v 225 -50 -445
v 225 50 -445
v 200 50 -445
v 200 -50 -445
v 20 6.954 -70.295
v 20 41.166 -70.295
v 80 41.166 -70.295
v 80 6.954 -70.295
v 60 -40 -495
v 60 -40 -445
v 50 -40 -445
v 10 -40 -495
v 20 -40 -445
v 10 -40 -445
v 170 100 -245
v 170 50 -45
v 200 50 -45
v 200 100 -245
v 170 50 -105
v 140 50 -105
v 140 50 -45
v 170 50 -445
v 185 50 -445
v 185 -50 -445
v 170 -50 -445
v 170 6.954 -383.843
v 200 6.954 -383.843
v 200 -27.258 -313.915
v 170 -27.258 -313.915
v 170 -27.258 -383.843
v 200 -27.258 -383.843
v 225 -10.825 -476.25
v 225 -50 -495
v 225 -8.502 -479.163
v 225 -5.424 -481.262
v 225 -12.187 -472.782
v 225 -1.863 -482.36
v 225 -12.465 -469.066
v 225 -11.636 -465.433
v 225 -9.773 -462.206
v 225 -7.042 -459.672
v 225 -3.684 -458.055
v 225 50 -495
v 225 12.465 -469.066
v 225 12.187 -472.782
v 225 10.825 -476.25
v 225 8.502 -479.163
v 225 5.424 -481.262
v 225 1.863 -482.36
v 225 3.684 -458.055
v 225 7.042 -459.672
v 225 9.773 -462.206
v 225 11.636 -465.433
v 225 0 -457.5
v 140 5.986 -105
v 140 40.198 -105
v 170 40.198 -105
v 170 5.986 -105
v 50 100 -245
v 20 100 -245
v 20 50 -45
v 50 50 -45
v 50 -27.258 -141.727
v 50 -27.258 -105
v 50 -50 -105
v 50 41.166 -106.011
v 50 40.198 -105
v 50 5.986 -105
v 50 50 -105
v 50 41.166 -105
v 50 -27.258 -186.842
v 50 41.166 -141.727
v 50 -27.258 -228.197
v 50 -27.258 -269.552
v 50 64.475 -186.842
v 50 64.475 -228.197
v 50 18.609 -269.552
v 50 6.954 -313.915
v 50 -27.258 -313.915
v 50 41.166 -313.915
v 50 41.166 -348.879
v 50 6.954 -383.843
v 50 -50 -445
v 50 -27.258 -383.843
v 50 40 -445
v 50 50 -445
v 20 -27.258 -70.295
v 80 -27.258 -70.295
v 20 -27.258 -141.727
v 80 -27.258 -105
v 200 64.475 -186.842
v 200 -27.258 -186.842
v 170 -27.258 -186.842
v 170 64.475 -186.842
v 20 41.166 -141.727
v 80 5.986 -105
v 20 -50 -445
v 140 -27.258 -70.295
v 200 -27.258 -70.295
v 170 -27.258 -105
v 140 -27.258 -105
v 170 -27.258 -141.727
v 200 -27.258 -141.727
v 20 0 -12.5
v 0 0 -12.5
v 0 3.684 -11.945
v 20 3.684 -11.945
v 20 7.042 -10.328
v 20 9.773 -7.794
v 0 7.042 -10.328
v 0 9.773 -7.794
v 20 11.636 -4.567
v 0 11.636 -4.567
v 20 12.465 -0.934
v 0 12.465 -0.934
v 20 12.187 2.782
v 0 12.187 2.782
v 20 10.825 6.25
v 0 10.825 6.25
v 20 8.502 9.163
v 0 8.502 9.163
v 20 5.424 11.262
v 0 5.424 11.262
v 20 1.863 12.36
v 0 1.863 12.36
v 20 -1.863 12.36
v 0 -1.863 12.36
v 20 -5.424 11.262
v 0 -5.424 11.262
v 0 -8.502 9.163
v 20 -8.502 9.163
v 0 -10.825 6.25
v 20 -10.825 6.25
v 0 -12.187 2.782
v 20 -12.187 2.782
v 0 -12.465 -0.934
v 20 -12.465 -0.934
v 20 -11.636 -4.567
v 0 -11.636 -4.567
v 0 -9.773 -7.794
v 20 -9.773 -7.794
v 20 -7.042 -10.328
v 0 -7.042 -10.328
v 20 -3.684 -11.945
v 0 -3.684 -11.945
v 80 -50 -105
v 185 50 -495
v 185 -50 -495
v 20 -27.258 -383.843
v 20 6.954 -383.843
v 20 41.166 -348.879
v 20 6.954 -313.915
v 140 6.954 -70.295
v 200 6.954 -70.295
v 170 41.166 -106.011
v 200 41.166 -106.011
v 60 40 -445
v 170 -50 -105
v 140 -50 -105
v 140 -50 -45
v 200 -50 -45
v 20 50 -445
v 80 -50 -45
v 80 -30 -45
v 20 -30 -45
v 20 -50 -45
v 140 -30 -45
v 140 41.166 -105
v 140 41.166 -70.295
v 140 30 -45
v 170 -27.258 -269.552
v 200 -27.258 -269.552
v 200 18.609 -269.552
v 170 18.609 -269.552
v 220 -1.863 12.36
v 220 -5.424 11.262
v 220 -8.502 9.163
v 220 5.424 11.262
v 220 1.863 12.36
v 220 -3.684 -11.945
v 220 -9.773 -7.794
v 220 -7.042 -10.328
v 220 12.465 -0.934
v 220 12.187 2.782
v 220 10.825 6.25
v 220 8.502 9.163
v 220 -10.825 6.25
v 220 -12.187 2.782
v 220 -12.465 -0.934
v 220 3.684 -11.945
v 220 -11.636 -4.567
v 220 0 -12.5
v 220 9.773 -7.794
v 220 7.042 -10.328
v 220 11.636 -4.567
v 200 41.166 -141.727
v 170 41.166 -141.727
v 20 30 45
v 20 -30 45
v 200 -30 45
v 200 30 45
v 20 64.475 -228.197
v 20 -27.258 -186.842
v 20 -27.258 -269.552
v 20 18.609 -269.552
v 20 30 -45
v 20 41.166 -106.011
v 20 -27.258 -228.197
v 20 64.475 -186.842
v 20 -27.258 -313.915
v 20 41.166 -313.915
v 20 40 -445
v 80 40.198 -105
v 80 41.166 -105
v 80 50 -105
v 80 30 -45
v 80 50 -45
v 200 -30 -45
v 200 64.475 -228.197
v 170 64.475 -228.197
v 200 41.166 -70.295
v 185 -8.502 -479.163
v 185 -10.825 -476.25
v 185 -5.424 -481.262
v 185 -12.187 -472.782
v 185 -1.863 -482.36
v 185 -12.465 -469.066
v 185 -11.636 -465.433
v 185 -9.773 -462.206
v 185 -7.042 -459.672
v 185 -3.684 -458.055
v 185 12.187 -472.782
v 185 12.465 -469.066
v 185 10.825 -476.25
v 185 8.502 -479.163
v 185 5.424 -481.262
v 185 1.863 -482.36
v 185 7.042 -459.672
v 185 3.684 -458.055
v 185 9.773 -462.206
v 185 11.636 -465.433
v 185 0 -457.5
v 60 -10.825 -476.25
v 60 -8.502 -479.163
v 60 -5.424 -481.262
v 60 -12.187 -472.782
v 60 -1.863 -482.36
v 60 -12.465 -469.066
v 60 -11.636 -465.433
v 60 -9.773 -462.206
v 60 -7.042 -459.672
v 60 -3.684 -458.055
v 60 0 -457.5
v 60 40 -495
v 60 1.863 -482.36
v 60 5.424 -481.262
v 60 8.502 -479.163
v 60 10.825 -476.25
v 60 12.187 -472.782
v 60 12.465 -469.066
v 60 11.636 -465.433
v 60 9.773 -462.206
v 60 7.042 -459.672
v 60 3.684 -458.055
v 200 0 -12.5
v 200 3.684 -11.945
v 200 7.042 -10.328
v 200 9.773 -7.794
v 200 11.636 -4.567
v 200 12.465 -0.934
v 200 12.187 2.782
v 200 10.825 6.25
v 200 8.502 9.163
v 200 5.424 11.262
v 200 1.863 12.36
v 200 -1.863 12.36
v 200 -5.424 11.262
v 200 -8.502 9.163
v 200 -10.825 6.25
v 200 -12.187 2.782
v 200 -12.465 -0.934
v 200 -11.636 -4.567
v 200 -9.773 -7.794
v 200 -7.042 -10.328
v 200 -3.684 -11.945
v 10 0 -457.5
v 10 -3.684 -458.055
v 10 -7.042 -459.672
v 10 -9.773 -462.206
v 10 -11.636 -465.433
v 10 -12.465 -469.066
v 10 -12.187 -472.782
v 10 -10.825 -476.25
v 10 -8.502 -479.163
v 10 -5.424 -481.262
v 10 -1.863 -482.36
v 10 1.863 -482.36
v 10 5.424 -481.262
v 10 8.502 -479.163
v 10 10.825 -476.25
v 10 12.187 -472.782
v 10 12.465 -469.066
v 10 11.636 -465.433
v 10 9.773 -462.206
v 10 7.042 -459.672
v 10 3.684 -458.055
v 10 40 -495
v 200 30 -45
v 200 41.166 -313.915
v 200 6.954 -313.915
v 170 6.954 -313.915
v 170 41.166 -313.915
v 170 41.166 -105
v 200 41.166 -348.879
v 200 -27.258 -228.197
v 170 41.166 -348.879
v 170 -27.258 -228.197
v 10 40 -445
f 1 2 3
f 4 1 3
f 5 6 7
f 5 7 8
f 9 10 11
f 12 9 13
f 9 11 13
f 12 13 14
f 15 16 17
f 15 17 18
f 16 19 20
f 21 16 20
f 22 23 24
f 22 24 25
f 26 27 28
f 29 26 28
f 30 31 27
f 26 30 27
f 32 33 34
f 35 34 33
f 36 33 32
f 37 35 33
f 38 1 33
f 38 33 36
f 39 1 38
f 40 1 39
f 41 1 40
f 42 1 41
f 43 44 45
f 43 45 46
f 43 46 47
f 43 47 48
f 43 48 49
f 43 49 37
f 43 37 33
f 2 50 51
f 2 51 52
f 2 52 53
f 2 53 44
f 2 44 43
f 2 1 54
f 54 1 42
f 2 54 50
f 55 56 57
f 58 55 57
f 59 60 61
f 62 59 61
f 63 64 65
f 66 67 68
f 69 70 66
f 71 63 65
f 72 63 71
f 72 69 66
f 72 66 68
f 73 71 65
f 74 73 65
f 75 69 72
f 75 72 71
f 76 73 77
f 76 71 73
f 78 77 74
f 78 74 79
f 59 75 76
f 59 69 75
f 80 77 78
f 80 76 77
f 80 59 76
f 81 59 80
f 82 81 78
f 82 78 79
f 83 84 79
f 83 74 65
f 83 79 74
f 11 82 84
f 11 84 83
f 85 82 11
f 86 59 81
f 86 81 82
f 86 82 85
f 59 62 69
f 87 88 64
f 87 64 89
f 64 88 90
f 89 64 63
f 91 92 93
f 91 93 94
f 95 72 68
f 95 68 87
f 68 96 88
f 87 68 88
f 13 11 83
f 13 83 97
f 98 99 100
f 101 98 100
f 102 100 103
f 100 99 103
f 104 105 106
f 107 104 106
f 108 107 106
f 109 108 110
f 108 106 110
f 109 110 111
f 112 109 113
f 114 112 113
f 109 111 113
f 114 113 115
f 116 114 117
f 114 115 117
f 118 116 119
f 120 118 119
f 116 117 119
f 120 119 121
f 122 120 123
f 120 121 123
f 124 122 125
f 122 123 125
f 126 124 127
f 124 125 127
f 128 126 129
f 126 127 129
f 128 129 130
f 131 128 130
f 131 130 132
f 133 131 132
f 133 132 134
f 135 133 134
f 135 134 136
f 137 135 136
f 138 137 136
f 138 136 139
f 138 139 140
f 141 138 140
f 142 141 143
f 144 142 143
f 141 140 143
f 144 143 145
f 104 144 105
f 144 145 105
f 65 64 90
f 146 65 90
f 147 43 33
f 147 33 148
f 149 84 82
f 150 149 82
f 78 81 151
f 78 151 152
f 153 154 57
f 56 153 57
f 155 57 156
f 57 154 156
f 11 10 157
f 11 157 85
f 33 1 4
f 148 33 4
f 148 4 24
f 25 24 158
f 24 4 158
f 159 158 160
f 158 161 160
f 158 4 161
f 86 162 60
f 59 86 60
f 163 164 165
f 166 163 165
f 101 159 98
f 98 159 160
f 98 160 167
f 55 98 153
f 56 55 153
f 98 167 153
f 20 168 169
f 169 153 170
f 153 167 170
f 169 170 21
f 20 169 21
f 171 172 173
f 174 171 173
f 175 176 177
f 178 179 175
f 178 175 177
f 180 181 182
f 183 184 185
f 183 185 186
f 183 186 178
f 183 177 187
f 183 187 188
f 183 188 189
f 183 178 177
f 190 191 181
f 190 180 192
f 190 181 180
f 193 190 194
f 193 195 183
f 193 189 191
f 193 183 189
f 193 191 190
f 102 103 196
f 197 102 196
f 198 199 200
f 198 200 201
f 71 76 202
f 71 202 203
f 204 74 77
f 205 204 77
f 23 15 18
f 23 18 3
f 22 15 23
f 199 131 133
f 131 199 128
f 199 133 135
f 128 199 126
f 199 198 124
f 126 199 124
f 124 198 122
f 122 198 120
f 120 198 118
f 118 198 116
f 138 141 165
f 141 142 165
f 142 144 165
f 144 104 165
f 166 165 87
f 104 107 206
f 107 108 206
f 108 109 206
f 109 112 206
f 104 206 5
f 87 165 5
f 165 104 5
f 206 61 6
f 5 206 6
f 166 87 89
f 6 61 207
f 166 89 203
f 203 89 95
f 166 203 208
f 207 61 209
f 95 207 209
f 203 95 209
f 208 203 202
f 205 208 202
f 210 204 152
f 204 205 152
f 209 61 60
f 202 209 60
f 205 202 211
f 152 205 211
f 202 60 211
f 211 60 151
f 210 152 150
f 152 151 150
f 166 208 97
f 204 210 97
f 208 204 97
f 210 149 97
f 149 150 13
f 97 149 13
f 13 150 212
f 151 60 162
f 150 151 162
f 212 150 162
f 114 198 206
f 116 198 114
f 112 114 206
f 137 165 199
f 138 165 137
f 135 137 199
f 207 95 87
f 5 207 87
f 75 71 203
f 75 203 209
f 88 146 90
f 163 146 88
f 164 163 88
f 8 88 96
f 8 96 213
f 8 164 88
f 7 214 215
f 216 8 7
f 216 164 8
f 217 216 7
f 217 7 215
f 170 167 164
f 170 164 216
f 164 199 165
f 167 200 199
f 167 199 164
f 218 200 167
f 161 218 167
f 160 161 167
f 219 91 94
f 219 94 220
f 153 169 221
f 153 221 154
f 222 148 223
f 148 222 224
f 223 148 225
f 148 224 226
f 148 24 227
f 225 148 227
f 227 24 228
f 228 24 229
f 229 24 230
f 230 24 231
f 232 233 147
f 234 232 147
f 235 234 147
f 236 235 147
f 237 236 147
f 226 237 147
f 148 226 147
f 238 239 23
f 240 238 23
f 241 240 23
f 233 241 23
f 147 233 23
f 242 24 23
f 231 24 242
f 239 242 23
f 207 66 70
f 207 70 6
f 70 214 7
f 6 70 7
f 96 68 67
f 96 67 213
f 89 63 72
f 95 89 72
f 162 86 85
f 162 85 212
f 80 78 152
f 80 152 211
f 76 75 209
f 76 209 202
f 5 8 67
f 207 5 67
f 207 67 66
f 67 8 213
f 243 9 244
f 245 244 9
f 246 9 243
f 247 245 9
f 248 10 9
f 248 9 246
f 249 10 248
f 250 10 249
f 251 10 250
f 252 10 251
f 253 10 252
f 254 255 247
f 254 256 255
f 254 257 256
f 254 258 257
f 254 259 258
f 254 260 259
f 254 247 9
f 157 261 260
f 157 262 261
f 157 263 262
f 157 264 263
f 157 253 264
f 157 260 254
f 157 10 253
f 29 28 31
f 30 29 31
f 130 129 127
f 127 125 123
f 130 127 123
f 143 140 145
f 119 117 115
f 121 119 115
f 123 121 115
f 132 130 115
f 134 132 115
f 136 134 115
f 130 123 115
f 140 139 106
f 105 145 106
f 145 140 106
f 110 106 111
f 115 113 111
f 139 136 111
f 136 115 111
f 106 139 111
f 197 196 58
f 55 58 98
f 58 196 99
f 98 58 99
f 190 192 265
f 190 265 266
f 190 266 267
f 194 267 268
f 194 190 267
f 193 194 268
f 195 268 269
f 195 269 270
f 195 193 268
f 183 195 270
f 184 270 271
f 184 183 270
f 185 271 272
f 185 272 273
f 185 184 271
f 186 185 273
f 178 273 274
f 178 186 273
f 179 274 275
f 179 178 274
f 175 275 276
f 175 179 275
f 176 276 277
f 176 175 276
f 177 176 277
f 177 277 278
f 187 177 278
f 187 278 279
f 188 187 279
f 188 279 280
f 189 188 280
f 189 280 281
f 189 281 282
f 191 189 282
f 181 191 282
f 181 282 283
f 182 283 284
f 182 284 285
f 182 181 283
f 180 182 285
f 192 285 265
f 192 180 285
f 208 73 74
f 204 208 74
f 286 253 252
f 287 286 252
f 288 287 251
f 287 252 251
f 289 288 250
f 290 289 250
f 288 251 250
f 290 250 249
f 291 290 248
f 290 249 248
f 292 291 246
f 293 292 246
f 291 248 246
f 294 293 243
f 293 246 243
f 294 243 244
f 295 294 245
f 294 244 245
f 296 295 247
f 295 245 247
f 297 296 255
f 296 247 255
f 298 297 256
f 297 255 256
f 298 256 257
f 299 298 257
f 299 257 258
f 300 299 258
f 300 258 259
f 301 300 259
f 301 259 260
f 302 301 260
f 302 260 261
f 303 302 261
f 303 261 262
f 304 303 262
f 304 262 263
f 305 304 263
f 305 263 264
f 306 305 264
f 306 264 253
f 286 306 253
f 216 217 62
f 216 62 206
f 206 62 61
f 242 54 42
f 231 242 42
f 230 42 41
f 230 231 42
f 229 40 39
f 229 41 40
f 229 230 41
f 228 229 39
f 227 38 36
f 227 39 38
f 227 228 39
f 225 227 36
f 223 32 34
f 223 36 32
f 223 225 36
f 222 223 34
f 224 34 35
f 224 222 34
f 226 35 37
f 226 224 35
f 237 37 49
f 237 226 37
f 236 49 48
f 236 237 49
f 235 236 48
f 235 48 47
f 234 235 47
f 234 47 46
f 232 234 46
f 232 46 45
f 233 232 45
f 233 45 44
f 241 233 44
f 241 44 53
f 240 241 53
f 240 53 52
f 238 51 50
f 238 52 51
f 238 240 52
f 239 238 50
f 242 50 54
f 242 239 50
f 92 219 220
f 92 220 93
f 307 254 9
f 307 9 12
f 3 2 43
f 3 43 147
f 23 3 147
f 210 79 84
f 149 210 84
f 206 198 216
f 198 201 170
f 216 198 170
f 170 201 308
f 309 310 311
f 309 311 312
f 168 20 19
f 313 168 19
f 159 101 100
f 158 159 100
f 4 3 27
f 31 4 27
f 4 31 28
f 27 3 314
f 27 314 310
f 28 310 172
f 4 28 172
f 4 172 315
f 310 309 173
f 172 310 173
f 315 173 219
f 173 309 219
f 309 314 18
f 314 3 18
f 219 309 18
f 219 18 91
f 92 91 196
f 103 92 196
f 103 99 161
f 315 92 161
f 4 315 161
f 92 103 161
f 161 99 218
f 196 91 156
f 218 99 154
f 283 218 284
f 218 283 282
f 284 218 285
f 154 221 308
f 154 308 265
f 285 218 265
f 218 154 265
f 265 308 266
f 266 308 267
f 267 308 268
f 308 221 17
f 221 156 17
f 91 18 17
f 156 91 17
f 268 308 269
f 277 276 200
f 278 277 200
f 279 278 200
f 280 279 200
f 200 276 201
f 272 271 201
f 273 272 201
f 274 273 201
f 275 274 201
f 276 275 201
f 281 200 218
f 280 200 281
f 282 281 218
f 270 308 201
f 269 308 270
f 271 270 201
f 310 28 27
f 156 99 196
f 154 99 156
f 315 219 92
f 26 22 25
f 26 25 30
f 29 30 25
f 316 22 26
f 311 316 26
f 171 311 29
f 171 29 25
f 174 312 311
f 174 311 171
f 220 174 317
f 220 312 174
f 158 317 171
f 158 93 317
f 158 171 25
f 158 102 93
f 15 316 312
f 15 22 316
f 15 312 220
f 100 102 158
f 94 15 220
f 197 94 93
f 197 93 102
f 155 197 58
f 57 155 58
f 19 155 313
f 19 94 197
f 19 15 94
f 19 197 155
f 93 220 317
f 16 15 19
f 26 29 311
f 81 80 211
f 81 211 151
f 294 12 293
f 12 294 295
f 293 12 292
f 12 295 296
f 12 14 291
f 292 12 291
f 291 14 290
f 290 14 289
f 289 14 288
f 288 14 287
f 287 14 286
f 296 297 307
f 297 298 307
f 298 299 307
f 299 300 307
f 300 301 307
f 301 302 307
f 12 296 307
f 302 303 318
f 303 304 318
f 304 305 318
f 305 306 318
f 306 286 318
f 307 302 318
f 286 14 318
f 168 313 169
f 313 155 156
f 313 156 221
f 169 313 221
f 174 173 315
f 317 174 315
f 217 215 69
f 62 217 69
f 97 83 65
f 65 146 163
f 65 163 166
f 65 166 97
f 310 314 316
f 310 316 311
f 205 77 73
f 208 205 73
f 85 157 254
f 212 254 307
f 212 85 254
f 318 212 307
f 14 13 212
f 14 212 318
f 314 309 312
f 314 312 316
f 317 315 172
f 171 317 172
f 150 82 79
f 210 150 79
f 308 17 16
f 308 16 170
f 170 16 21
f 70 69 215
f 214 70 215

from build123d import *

# Parameters (mm, degrees)
SKETCH1_R                      = 12.5
BOSS_EXTRUDE1_DEPTH            = 20
SKETCH2_W                      = 90
SKETCH2_H                      = 60
BOSS_EXTRUDE2_DEPTH            = 90
SKETCH6_W                      = 60
SKETCH6_H                      = 100
BOSS_EXTRUDE4_DEPTH            = 400
SKETCH8_W                      = 120
SKETCH8_H                      = 340
CUT_EXTRUDE4_DEPTH             = 507.384241461
BOSS_EXTRUDE5_DEPTH            = 30
BOSS_EXTRUDE6_START            = -30
BOSS_EXTRUDE6_DEPTH            = 30
CUT_EXTRUDE6_DEPTH             = 180
SKETCH12_W                     = 50
SKETCH12_H                     = 80
BOSS_EXTRUDE7_DEPTH            = 50
SKETCH14_W                     = 40
SKETCH14_H                     = 100
BOSS_EXTRUDE8_DEPTH            = 50
SKETCH13_R                     = 12.5
CUT_EXTRUDE7_DEPTH             = 100
CUT_EXTRUDE7_DIRECTION_2_REACH = 533.272


with BuildPart() as part:
    # Sketch1 → Boss-Extrude1 (new body)
    with BuildSketch(Plane(origin=(0, 0, 0), x_dir=(0, 0, -1), z_dir=(1, 0, 0))):
        Circle(SKETCH1_R)
    extrude(amount=BOSS_EXTRUDE1_DEPTH)

    # Sketch2 → Boss-Extrude2 (add)
    with BuildSketch(Plane(origin=(20, 0, 0), x_dir=(0, 0, -1), z_dir=(1, 0, 0))):
        Rectangle(SKETCH2_W, SKETCH2_H)
    extrude(amount=BOSS_EXTRUDE2_DEPTH)

    # Mirror1: part across plane


with BuildPart() as part_1:
    add(part.part)
    add(part.part.mirror(Plane.ZY.offset(-110)))

    # Sketch6 → Boss-Extrude4 (add)
    with BuildSketch(Plane(origin=(0, 0, -45), x_dir=(-1, 0, 0), z_dir=(0, 0, -1))):
        with Locations((-50, 0)):
            Rectangle(SKETCH6_W, SKETCH6_H)
        with Locations((-170, 0)):
            Rectangle(SKETCH6_W, SKETCH6_H)
    extrude(amount=BOSS_EXTRUDE4_DEPTH)

    # Sketch8 → Cut-Extrude4 (cut, through all)
    with BuildSketch(Plane(origin=(0, 50, 0), x_dir=(1, 0, 0), z_dir=(0, 1, 0))):
        with Locations((110, 275)):
            Rectangle(SKETCH8_W, SKETCH8_H)
    extrude(amount=-CUT_EXTRUDE4_DEPTH, mode=Mode.SUBTRACT)

    # Sketch9 → Boss-Extrude5 (add)
    with BuildSketch(Plane.ZY.offset(-20)):
        Polygon((-445, 50), (-245, 100), (-45, 50), align=None)
    extrude(amount=-BOSS_EXTRUDE5_DEPTH)

    # Sketch10 → Boss-Extrude6 (add)
    with BuildSketch(Plane(origin=(200, 0, 0), x_dir=(0, 0, -1), z_dir=(1, 0, 0)).offset(BOSS_EXTRUDE6_START)):
        Polygon((245, 100), (445, 50), (45, 50), align=None)
    extrude(amount=BOSS_EXTRUDE6_DEPTH)

    # Sketch11 → Cut-Extrude6 (cut)
    with BuildSketch(Plane(origin=(200, 0, 0), x_dir=(0, 0, -1), z_dir=(1, 0, 0))):
        Polygon((70.294812967, 6.954060935), (106.010734034, 41.166153746), (70.294812967, 41.166153746), align=None)
        Polygon((70.294812967, -27.258031877), (141.726655101, -27.258031877), (141.726655101, 41.166153746), align=None)
        Polygon((186.841502765, 64.475491706), (228.19677979, 64.475491706), (186.841502765, -27.258031877), align=None)
        Polygon((228.19677979, -27.258031877), (269.552056815, -27.258031877), (269.552056815, 18.608729914), align=None)
        Polygon((313.914990351, 41.166153746), (348.87899729, 41.166153746), (313.914990351, 6.954060935), align=None)
        Polygon((313.914990351, -27.258031877), (383.843004229, -27.258031877), (383.843004229, 6.954060935), align=None)
    extrude(amount=-CUT_EXTRUDE6_DEPTH, mode=Mode.SUBTRACT)

    # Sketch12 → Boss-Extrude7 (add)
    with BuildSketch(Plane(origin=(0, 0, -445), x_dir=(-1, 0, 0), z_dir=(0, 0, -1))):
        with Locations((-35, 0)):
            Rectangle(SKETCH12_W, SKETCH12_H)
    extrude(amount=BOSS_EXTRUDE7_DEPTH)

    # Sketch14 → Boss-Extrude8 (add, through all)
    with BuildSketch(Plane(origin=(0, 0, -445), x_dir=(-1, 0, 0), z_dir=(0, 0, -1))):
        with Locations((-205, 0)):
            Rectangle(SKETCH14_W, SKETCH14_H)
    extrude(amount=BOSS_EXTRUDE8_DEPTH)

    # Sketch13 → Cut-Extrude7 (cut)
    with BuildSketch(Plane(origin=(60, 0, 0), x_dir=(0, 0, -1), z_dir=(1, 0, 0))):
        with Locations(Location((470, 0, 0), (0, 0, 180))):
            Circle(SKETCH13_R)
    extrude(amount=-CUT_EXTRUDE7_DEPTH, mode=Mode.SUBTRACT)

    # Sketch13 → Cut-Extrude7 direction 2 (cut, up to next)
    with BuildSketch(Plane(origin=(60, 0, 0), x_dir=(0, 0, -1), z_dir=(1, 0, 0)), mode=Mode.PRIVATE) as cut_extrude7_direction_2_sk1:
        with Locations(Location((470, 0, 0), (0, 0, 180))):
            Circle(SKETCH13_R)
    cut_extrude7_direction_2_tool1 = extrude(cut_extrude7_direction_2_sk1.sketch, amount=CUT_EXTRUDE7_DIRECTION_2_REACH, mode=Mode.PRIVATE) & part_1.part
    add(cut_extrude7_direction_2_tool1.solids().sort_by_distance((60, 0, -470))[0], mode=Mode.SUBTRACT)


solid = part_1.part
